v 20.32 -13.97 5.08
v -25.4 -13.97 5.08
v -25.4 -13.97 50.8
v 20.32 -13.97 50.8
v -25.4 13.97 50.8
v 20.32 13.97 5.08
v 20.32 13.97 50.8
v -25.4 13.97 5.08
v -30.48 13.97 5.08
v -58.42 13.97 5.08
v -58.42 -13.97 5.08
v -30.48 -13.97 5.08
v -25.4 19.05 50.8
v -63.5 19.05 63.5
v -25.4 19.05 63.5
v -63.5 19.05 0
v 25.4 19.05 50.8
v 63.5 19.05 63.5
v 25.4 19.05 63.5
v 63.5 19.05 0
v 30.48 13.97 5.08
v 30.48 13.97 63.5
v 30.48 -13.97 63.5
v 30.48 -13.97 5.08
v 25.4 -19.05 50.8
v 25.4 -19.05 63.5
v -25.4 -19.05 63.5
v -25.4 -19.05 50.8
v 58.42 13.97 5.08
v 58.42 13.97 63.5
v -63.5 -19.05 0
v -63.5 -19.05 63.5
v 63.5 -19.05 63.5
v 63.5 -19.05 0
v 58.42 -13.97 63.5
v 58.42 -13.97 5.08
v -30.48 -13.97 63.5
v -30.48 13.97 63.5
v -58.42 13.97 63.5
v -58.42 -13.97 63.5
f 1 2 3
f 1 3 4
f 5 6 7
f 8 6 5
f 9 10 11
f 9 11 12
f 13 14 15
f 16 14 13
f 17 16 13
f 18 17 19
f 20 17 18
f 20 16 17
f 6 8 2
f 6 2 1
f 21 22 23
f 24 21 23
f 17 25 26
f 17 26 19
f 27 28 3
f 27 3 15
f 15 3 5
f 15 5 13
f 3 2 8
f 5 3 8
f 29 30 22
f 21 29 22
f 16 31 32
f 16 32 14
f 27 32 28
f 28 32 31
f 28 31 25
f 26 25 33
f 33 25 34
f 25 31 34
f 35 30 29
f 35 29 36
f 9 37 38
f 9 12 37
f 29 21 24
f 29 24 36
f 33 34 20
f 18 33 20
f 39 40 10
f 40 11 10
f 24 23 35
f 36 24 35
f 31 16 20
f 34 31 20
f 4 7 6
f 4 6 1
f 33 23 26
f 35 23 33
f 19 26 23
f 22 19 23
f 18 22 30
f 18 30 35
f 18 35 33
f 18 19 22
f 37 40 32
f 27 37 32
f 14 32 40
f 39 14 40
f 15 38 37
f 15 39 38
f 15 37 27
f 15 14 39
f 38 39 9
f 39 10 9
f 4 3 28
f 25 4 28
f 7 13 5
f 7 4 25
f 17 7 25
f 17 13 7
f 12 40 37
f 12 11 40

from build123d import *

# Parameters (mm, degrees)
F0_W      = 38.1
F0_H      = 38.1
F1_DEPTH  = 63.5
F2_T      = -5.08
F0_W_2    = 50.8
F3_DEPTH  = 50.8
F0_W_3    = 33.02
F4_DEPTH  = 63.5
F5_T      = -5.08
F0_W_4    = 5.08
F7_DEPTH  = 63.5
F8_DEPTH  = 63.5
F9_T      = -5.08
F10_DEPTH = 50.8


# Not quite as in the source:
# - a shell that OpenCascade refuses in one call is made with other operations: the cavity is built on its own and cut out


with BuildPart() as f1:
    # F0 (on Top) → F1 (new body)
    with BuildSketch(Plane.XY):
        with Locations((-44.45, 0)):
            Rectangle(F0_W, F0_H)
    extrude(amount=F1_DEPTH)

    # F2
    f2_openings = [f1.faces().sort_by_distance(p)[0] for p in [
        (-44.45, 0, 63.5),
    ]]
    offset(amount=F2_T, openings=f2_openings)

    # F0 (on Top) → F3 (join)
    with BuildSketch(Plane.XY):
        Rectangle(F0_W_2, F0_H)
    extrude(amount=F3_DEPTH)

    # F5: a shell. OpenCascade refuses it in one call, so the cavity is built on its own and cut out:
    # the body offset inwards by the wall thickness, plus a prism from it out through each open face.
    f5_core = offset(f1.part, amount=F5_T, kind=Kind.INTERSECTION, mode=Mode.PRIVATE)
    f5_exits = [f5_core.faces().sort_by_distance(p)[0] for p in [
        (-2.54, 0, 45.72),
    ]]
    add(f5_core, mode=Mode.SUBTRACT)
    extrude(f5_exits, amount=-F5_T, mode=Mode.SUBTRACT)

    # F0 (on Top) → F7 (join)
    with BuildSketch(Plane.XY):
        with Locations((27.94, 0)):
            Rectangle(F0_W_4, F0_H)
    extrude(amount=F7_DEPTH)

    # F0 (on Top) → F8 (join)
    with BuildSketch(Plane.XY):
        with Locations((46.99, 0)):
            Rectangle(F0_W_3, F0_H)
    extrude(amount=F8_DEPTH)

    # F9: a shell. OpenCascade refuses it in one call, so the cavity is built on its own and cut out:
    # the body offset inwards by the wall thickness, plus a prism from it out through each open face.
    f9_core = offset(f1.part, amount=F9_T, kind=Kind.INTERSECTION, mode=Mode.PRIVATE)
    f9_exits = [f9_core.faces().sort_by_distance(p)[0] for p in [
        (44.45, 0, 58.42),
    ]]
    add(f9_core, mode=Mode.SUBTRACT)
    extrude(f9_exits, amount=-F9_T, mode=Mode.SUBTRACT)

    # F0 (on Top) → F10 (join)
    with BuildSketch(Plane.XY):
        with Locations((27.94, 0)):
            Rectangle(F0_W_4, F0_H)
    extrude(amount=F10_DEPTH)


with BuildPart() as f4:
    # F0 (on Top) → F4 (new body)
    with BuildSketch(Plane.XY):
        with Locations((46.99, 0)):
            Rectangle(F0_W_3, F0_H)
    extrude(amount=F4_DEPTH)


solid = f1.part
